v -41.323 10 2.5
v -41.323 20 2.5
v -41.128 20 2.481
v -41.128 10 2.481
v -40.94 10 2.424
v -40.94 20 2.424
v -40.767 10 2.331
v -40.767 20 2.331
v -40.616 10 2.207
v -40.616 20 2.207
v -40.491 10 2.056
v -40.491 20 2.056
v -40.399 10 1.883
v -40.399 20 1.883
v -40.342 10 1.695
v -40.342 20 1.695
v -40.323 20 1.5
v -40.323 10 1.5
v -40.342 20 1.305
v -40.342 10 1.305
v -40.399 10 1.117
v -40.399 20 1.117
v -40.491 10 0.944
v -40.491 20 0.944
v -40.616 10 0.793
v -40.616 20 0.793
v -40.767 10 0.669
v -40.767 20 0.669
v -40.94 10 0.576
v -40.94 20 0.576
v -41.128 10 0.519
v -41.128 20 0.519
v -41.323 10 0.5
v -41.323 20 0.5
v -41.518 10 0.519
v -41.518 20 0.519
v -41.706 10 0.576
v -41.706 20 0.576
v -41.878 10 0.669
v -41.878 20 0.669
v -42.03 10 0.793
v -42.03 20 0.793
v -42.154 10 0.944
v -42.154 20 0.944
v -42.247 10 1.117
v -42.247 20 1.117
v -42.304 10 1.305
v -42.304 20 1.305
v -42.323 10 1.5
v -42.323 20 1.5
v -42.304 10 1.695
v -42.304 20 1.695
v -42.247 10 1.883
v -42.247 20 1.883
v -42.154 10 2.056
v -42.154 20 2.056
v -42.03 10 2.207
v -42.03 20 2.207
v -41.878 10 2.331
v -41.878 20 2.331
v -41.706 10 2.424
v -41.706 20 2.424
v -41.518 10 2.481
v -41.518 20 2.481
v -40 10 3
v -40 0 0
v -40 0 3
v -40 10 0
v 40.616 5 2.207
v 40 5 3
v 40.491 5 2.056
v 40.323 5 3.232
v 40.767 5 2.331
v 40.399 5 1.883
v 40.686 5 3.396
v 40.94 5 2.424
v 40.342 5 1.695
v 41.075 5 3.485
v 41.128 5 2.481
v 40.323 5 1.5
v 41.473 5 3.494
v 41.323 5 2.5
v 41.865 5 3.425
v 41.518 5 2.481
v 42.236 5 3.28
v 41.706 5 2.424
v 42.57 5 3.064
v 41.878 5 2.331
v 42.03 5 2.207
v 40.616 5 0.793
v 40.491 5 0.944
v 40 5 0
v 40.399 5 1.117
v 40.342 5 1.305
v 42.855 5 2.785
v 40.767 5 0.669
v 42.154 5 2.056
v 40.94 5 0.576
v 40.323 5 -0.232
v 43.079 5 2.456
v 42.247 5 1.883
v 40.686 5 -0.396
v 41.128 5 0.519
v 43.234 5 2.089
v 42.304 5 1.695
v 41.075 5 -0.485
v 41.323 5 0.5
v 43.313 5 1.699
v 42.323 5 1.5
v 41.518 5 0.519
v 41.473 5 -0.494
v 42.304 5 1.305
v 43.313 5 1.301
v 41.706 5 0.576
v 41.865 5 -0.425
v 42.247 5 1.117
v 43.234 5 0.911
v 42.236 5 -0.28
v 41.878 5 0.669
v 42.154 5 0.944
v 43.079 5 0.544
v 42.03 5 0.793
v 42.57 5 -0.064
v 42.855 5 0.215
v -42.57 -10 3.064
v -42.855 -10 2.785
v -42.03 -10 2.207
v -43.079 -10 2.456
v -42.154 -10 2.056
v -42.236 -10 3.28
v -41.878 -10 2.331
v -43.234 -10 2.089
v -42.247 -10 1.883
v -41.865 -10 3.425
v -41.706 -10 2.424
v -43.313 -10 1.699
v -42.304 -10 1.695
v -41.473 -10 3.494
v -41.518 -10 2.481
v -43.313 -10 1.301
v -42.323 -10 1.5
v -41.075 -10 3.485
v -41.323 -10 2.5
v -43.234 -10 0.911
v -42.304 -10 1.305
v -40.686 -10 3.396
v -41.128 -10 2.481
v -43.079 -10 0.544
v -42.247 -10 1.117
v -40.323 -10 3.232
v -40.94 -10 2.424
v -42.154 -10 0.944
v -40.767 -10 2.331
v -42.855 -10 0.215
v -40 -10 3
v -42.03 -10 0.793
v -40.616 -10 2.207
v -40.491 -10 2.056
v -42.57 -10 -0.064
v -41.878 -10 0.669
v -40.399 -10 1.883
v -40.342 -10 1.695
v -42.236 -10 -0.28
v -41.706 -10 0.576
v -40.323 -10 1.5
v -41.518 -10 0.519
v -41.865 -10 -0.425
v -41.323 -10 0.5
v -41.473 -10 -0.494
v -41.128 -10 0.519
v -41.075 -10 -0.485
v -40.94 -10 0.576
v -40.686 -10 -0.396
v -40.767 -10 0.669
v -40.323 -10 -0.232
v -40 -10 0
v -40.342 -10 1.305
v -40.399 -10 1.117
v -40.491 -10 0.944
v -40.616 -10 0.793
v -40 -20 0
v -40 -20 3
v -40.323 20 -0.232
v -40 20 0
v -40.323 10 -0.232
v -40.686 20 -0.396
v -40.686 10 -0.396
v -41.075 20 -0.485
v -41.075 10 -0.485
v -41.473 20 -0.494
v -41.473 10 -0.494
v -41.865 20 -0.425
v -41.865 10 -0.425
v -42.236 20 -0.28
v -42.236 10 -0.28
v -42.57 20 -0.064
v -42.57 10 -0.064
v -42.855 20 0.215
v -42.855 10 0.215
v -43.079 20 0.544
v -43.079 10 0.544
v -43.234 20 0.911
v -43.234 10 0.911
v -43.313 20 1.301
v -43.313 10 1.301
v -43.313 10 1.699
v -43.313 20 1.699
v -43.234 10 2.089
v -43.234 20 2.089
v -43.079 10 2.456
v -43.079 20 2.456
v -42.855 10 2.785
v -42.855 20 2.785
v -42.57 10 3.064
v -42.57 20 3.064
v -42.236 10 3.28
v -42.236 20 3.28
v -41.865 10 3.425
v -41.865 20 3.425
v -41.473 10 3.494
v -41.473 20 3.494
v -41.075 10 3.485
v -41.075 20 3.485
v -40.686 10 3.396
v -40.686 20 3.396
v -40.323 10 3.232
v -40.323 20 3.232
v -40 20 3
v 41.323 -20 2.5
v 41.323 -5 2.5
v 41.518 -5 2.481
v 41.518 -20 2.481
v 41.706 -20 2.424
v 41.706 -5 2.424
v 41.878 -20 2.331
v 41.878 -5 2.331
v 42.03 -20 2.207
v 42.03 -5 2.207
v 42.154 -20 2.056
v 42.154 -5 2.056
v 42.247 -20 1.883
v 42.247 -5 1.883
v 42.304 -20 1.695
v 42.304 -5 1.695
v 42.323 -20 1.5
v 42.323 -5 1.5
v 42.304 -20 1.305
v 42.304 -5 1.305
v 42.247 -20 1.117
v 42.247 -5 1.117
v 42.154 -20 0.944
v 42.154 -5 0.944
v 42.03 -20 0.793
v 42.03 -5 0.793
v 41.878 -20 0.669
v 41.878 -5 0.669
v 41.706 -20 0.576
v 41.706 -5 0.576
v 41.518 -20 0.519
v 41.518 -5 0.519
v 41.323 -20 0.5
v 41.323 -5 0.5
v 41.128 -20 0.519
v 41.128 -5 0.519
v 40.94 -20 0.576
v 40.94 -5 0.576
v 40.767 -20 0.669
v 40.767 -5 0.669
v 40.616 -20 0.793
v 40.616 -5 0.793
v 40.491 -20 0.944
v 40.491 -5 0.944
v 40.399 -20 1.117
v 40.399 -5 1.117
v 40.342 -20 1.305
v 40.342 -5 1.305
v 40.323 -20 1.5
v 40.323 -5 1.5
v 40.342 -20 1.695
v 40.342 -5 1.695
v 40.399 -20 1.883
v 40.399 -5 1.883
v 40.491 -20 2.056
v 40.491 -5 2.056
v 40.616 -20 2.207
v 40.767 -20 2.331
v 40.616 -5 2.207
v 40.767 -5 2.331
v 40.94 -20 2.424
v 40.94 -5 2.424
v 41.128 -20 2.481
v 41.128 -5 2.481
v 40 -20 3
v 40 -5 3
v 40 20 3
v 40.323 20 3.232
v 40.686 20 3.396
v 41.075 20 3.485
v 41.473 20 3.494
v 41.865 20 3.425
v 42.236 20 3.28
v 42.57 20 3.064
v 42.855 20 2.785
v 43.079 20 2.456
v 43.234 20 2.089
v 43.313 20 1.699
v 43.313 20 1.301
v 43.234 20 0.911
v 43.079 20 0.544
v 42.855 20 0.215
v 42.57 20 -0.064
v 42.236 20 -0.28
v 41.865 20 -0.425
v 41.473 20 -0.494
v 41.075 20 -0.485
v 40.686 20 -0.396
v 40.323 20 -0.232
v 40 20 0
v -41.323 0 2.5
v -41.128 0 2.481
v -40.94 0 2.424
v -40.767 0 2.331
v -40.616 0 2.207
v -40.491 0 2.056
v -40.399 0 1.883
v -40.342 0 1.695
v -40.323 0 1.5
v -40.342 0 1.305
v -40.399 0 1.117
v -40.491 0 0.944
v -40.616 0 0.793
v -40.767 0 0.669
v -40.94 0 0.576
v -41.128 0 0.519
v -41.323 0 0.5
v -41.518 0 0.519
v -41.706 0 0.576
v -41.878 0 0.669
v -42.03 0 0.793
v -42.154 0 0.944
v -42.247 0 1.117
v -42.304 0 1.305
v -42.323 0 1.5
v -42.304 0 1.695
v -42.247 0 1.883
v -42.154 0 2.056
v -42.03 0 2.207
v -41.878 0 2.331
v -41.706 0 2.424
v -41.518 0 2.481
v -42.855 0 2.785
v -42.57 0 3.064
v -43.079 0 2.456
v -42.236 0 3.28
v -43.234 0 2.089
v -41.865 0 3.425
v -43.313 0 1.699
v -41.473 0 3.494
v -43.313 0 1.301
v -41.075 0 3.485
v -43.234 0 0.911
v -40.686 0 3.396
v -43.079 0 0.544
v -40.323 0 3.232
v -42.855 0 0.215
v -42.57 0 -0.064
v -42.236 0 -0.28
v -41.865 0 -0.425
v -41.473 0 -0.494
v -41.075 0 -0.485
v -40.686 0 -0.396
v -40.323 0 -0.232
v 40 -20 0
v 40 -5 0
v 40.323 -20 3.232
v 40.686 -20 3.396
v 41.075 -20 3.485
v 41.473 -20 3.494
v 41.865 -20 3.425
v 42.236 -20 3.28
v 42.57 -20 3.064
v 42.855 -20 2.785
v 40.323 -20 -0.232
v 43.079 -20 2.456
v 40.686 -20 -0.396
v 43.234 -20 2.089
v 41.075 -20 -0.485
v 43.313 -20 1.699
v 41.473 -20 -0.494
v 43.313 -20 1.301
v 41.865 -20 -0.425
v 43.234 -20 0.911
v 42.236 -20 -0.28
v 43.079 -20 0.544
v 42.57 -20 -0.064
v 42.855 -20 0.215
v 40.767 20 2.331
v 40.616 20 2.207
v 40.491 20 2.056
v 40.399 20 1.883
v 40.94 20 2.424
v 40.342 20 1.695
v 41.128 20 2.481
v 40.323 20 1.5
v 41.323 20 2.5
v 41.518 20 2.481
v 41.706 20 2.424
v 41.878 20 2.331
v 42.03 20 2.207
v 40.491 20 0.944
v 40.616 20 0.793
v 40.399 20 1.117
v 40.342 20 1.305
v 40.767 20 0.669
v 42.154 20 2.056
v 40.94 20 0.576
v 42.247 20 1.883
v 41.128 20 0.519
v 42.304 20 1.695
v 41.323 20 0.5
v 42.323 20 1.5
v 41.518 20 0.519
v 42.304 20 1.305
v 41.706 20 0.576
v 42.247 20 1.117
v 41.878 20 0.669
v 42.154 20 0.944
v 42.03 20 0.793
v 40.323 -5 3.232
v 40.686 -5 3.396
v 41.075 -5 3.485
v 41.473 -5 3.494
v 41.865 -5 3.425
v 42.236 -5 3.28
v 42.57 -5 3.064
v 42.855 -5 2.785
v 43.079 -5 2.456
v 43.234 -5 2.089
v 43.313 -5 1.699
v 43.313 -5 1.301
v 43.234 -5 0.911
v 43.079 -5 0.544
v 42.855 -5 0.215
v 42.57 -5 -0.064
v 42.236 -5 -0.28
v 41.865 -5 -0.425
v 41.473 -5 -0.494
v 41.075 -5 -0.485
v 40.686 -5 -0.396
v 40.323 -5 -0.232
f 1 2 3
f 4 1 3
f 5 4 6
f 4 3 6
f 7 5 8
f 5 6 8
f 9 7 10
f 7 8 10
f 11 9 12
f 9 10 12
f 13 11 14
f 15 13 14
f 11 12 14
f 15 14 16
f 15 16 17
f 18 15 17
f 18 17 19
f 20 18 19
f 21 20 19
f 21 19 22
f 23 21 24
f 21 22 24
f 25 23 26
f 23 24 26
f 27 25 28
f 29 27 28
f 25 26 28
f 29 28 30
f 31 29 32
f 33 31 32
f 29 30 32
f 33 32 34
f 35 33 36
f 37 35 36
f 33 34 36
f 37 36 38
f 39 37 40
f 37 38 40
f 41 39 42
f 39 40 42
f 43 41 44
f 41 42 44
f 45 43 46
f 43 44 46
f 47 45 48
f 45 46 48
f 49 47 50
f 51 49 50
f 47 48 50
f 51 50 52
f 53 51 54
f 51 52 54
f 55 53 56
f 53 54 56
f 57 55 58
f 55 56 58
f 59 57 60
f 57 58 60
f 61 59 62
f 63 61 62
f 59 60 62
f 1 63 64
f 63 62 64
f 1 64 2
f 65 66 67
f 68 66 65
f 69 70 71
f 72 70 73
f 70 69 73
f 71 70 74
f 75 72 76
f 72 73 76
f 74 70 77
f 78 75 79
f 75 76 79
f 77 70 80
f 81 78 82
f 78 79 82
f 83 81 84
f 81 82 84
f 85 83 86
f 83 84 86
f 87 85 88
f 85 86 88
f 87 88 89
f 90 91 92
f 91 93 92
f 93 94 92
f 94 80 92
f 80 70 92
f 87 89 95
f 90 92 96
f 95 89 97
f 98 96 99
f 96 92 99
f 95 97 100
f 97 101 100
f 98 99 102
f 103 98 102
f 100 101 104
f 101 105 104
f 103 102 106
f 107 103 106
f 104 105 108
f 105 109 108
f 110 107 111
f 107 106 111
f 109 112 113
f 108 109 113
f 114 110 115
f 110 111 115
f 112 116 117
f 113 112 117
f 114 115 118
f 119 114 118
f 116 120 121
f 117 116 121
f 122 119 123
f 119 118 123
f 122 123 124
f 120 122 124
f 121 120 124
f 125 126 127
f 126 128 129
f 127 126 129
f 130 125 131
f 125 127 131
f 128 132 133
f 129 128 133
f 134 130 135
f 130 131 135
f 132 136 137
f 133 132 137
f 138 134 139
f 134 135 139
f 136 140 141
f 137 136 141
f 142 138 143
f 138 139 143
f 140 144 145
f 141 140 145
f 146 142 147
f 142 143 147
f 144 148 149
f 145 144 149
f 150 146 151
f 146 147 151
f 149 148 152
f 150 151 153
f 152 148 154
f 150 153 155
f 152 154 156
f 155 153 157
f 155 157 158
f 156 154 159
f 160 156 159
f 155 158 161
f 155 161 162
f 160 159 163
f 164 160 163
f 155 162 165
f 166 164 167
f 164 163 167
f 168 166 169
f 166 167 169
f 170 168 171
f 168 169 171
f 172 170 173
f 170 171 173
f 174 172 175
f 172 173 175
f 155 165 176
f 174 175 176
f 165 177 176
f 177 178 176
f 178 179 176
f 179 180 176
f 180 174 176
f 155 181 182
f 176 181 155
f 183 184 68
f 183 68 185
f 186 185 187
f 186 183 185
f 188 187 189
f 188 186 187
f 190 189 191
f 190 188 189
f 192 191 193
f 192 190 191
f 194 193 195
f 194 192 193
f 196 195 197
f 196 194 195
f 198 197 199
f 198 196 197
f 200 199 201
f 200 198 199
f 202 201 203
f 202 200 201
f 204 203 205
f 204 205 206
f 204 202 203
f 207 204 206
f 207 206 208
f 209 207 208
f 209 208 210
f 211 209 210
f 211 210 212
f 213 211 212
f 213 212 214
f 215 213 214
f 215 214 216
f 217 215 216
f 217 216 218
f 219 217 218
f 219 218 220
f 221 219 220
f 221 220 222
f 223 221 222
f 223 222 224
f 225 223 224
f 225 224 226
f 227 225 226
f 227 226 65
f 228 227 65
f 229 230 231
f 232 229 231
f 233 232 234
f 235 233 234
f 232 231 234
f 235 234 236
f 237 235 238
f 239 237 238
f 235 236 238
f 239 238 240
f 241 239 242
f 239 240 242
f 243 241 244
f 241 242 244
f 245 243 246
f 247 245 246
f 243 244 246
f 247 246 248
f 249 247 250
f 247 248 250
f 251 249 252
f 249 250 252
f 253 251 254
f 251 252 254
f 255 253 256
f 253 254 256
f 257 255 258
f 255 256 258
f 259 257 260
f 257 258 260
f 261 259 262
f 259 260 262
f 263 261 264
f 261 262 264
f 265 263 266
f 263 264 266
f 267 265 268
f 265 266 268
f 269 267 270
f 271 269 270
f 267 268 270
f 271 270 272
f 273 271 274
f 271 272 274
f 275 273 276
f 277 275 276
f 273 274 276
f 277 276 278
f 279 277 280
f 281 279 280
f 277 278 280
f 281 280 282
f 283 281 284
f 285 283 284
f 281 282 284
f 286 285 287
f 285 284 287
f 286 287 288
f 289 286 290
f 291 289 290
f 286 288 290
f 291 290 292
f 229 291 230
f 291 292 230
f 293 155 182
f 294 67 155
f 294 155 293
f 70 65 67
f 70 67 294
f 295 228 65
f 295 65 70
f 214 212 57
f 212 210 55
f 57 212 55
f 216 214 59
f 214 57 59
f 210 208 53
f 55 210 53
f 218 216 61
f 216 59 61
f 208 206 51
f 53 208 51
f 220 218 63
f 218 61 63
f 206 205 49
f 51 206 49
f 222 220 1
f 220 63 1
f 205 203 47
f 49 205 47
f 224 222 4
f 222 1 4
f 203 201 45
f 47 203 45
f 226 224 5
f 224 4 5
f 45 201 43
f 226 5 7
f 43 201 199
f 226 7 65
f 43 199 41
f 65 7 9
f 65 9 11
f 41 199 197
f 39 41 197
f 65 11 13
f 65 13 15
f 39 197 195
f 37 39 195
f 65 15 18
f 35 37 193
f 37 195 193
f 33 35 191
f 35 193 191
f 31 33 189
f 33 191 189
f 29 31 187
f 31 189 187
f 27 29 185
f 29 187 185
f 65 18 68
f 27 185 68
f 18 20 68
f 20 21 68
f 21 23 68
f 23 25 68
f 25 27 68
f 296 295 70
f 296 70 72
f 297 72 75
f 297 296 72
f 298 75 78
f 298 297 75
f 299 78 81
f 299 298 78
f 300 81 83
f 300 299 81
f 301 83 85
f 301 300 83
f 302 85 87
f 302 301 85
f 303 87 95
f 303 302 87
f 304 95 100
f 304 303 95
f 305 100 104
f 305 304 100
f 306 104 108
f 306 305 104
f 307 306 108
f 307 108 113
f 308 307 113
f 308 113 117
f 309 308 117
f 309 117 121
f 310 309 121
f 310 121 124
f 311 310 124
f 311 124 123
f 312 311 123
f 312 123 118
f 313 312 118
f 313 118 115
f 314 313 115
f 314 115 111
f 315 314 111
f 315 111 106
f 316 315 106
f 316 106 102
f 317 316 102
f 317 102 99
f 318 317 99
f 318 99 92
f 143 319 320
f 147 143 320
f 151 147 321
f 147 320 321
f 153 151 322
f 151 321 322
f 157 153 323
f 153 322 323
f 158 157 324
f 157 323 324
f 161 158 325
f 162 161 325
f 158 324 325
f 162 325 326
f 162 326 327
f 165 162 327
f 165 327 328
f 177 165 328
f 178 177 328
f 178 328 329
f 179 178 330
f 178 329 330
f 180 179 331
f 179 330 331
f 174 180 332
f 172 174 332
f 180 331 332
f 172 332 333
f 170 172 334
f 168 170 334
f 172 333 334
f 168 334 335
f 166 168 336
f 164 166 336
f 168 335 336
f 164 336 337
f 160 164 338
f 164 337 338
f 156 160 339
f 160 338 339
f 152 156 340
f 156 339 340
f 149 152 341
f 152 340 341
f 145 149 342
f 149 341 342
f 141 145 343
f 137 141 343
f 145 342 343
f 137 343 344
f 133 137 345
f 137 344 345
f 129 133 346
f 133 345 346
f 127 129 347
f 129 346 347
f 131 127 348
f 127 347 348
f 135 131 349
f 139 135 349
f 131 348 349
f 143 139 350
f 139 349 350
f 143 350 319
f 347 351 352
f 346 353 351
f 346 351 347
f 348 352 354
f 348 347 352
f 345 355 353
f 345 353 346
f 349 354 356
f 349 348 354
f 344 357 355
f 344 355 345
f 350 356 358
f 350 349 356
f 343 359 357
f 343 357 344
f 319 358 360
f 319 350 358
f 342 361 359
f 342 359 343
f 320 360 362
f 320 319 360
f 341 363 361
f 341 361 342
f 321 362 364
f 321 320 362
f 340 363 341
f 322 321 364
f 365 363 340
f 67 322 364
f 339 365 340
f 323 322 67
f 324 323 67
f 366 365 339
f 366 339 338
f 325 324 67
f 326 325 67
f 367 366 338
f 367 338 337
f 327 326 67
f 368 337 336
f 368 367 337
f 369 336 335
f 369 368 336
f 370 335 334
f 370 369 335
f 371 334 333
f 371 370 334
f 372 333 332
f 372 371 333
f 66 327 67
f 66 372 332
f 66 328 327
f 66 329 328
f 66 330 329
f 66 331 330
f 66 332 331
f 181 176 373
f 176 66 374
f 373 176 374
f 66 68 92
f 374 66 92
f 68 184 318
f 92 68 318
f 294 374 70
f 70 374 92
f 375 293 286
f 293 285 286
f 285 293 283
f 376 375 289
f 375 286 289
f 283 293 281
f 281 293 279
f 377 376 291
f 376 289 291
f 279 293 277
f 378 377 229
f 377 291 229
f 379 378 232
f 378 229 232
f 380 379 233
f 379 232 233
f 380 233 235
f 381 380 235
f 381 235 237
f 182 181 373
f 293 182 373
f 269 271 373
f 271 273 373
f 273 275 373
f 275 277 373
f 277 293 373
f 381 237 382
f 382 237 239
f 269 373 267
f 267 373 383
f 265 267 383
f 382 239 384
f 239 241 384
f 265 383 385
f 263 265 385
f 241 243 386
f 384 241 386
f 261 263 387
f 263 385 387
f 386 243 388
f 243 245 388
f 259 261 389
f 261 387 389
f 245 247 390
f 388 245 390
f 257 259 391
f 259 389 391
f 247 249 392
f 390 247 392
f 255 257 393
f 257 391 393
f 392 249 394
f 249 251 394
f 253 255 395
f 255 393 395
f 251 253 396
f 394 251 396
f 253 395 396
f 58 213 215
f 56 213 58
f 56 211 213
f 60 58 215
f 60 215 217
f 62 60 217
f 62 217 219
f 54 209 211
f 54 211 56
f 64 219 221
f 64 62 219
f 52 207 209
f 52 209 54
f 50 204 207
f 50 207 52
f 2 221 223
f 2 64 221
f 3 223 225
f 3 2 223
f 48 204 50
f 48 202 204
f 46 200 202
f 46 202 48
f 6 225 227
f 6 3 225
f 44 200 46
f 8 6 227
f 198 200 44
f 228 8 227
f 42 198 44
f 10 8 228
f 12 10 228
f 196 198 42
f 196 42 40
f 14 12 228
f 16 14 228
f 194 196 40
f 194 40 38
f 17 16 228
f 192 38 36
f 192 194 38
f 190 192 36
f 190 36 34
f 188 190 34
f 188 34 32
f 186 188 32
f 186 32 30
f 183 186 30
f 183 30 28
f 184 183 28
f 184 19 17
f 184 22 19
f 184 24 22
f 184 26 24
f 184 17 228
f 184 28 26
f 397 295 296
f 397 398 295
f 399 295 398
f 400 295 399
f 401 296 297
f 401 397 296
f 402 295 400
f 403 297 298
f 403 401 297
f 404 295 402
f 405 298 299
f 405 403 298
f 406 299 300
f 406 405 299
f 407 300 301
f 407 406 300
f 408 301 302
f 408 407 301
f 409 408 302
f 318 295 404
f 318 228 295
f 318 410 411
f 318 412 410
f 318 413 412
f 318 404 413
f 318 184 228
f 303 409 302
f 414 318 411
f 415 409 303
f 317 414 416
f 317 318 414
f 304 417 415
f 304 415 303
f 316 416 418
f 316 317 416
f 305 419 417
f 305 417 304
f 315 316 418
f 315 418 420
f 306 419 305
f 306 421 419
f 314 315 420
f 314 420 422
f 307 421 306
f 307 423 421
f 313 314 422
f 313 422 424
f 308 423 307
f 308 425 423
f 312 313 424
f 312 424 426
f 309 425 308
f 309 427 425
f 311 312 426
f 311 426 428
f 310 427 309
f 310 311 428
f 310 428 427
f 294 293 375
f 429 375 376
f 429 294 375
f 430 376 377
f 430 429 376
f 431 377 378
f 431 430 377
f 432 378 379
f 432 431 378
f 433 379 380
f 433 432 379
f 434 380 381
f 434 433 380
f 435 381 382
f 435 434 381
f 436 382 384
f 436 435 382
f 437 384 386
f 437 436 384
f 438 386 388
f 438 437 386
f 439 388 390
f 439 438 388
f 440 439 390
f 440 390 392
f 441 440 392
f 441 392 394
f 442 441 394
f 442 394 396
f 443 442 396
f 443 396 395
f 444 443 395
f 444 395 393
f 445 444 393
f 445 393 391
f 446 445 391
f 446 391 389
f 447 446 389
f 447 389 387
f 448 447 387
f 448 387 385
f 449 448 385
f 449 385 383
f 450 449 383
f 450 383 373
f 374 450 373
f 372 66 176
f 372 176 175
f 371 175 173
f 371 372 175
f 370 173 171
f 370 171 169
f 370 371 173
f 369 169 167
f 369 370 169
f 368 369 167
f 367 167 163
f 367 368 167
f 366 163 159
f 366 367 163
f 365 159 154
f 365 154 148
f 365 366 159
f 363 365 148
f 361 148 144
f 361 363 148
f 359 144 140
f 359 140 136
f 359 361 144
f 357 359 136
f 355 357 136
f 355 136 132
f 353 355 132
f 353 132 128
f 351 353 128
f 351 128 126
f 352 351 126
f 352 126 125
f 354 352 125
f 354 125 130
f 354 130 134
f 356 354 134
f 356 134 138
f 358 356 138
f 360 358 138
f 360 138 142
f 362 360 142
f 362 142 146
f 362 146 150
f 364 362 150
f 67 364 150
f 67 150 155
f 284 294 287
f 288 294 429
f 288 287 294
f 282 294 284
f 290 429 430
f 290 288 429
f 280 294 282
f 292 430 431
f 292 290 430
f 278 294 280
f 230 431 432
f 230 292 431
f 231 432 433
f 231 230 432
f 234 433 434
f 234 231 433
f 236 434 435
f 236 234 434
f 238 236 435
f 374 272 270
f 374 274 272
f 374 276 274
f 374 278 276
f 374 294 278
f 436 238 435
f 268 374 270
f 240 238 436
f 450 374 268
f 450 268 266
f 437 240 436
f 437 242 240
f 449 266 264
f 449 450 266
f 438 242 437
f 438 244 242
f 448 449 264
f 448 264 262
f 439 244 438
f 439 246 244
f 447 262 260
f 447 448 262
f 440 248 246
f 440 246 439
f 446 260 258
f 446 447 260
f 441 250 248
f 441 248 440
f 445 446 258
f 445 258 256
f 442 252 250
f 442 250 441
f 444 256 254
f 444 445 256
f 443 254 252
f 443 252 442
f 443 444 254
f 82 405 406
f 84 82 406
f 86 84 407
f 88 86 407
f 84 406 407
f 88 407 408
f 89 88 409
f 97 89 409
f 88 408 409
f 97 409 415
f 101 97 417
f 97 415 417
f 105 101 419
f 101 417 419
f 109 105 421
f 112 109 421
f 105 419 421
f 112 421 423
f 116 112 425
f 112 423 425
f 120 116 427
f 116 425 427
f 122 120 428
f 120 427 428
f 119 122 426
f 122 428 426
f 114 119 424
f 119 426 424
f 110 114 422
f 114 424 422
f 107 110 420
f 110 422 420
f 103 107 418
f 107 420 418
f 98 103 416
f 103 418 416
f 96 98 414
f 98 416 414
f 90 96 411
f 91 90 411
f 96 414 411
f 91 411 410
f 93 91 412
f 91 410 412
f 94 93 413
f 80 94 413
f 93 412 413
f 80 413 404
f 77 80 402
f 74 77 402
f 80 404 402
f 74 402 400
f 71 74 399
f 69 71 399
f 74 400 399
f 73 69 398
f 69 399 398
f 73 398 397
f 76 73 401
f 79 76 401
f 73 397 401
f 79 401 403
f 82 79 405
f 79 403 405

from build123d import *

# Parameters (mm, degrees)
SKETCH1_W           = 80
SKETCH1_H           = 40
BOSS_EXTRUDE1_DEPTH = 3
SKETCH2_R           = 2
SKETCH2_R_2         = 1
BOSS_EXTRUDE3_DEPTH = 10
LPATTERN1_COUNT     = 2
LPATTERN1_PITCH     = 20
SKETCH3_R           = 2
SKETCH3_R_2         = 1
BOSS_EXTRUDE4_DEPTH = 15
LPATTERN2_COUNT     = 2
LPATTERN2_PITCH     = 25


with BuildPart() as part:
    # Sketch1 → Boss-Extrude1 (new body)
    with BuildSketch(Plane.XY):
        Rectangle(SKETCH1_W, SKETCH1_H)
    extrude(amount=BOSS_EXTRUDE1_DEPTH)

    # Sketch2 → Boss-Extrude3 (add)
    with BuildSketch(Plane(origin=(0, 20, 0), x_dir=(1, 0, 0), z_dir=(0, 1, 0))):
        with Locations((-41.322875656, -1.5)):
            Circle(SKETCH2_R)
        with Locations(Location((-41.322875656, -1.5, 0), (0, 0, 270))):
            Circle(SKETCH2_R_2, mode=Mode.SUBTRACT)
    boss_extrude3 = extrude(amount=-BOSS_EXTRUDE3_DEPTH)

    # LPattern1: Boss-Extrude3 ×2
    with Locations(*[(0, -i * LPATTERN1_PITCH, 0) for i in range(1, LPATTERN1_COUNT)]):
        add(boss_extrude3)

    # Sketch3 → Boss-Extrude4 (add)
    with BuildSketch(Plane(origin=(0, 20, 0), x_dir=(1, 0, 0), z_dir=(0, 1, 0))):
        with Locations((41.322875656, -1.5)):
            Circle(SKETCH3_R)
        with Locations(Location((41.322875656, -1.5, 0), (0, 0, 270))):
            Circle(SKETCH3_R_2, mode=Mode.SUBTRACT)
    boss_extrude4 = extrude(amount=-BOSS_EXTRUDE4_DEPTH)

    # LPattern2: Boss-Extrude4 ×2
    with Locations(*[(0, -i * LPATTERN2_PITCH, 0) for i in range(1, LPATTERN2_COUNT)]):
        add(boss_extrude4)


solid = part.part
